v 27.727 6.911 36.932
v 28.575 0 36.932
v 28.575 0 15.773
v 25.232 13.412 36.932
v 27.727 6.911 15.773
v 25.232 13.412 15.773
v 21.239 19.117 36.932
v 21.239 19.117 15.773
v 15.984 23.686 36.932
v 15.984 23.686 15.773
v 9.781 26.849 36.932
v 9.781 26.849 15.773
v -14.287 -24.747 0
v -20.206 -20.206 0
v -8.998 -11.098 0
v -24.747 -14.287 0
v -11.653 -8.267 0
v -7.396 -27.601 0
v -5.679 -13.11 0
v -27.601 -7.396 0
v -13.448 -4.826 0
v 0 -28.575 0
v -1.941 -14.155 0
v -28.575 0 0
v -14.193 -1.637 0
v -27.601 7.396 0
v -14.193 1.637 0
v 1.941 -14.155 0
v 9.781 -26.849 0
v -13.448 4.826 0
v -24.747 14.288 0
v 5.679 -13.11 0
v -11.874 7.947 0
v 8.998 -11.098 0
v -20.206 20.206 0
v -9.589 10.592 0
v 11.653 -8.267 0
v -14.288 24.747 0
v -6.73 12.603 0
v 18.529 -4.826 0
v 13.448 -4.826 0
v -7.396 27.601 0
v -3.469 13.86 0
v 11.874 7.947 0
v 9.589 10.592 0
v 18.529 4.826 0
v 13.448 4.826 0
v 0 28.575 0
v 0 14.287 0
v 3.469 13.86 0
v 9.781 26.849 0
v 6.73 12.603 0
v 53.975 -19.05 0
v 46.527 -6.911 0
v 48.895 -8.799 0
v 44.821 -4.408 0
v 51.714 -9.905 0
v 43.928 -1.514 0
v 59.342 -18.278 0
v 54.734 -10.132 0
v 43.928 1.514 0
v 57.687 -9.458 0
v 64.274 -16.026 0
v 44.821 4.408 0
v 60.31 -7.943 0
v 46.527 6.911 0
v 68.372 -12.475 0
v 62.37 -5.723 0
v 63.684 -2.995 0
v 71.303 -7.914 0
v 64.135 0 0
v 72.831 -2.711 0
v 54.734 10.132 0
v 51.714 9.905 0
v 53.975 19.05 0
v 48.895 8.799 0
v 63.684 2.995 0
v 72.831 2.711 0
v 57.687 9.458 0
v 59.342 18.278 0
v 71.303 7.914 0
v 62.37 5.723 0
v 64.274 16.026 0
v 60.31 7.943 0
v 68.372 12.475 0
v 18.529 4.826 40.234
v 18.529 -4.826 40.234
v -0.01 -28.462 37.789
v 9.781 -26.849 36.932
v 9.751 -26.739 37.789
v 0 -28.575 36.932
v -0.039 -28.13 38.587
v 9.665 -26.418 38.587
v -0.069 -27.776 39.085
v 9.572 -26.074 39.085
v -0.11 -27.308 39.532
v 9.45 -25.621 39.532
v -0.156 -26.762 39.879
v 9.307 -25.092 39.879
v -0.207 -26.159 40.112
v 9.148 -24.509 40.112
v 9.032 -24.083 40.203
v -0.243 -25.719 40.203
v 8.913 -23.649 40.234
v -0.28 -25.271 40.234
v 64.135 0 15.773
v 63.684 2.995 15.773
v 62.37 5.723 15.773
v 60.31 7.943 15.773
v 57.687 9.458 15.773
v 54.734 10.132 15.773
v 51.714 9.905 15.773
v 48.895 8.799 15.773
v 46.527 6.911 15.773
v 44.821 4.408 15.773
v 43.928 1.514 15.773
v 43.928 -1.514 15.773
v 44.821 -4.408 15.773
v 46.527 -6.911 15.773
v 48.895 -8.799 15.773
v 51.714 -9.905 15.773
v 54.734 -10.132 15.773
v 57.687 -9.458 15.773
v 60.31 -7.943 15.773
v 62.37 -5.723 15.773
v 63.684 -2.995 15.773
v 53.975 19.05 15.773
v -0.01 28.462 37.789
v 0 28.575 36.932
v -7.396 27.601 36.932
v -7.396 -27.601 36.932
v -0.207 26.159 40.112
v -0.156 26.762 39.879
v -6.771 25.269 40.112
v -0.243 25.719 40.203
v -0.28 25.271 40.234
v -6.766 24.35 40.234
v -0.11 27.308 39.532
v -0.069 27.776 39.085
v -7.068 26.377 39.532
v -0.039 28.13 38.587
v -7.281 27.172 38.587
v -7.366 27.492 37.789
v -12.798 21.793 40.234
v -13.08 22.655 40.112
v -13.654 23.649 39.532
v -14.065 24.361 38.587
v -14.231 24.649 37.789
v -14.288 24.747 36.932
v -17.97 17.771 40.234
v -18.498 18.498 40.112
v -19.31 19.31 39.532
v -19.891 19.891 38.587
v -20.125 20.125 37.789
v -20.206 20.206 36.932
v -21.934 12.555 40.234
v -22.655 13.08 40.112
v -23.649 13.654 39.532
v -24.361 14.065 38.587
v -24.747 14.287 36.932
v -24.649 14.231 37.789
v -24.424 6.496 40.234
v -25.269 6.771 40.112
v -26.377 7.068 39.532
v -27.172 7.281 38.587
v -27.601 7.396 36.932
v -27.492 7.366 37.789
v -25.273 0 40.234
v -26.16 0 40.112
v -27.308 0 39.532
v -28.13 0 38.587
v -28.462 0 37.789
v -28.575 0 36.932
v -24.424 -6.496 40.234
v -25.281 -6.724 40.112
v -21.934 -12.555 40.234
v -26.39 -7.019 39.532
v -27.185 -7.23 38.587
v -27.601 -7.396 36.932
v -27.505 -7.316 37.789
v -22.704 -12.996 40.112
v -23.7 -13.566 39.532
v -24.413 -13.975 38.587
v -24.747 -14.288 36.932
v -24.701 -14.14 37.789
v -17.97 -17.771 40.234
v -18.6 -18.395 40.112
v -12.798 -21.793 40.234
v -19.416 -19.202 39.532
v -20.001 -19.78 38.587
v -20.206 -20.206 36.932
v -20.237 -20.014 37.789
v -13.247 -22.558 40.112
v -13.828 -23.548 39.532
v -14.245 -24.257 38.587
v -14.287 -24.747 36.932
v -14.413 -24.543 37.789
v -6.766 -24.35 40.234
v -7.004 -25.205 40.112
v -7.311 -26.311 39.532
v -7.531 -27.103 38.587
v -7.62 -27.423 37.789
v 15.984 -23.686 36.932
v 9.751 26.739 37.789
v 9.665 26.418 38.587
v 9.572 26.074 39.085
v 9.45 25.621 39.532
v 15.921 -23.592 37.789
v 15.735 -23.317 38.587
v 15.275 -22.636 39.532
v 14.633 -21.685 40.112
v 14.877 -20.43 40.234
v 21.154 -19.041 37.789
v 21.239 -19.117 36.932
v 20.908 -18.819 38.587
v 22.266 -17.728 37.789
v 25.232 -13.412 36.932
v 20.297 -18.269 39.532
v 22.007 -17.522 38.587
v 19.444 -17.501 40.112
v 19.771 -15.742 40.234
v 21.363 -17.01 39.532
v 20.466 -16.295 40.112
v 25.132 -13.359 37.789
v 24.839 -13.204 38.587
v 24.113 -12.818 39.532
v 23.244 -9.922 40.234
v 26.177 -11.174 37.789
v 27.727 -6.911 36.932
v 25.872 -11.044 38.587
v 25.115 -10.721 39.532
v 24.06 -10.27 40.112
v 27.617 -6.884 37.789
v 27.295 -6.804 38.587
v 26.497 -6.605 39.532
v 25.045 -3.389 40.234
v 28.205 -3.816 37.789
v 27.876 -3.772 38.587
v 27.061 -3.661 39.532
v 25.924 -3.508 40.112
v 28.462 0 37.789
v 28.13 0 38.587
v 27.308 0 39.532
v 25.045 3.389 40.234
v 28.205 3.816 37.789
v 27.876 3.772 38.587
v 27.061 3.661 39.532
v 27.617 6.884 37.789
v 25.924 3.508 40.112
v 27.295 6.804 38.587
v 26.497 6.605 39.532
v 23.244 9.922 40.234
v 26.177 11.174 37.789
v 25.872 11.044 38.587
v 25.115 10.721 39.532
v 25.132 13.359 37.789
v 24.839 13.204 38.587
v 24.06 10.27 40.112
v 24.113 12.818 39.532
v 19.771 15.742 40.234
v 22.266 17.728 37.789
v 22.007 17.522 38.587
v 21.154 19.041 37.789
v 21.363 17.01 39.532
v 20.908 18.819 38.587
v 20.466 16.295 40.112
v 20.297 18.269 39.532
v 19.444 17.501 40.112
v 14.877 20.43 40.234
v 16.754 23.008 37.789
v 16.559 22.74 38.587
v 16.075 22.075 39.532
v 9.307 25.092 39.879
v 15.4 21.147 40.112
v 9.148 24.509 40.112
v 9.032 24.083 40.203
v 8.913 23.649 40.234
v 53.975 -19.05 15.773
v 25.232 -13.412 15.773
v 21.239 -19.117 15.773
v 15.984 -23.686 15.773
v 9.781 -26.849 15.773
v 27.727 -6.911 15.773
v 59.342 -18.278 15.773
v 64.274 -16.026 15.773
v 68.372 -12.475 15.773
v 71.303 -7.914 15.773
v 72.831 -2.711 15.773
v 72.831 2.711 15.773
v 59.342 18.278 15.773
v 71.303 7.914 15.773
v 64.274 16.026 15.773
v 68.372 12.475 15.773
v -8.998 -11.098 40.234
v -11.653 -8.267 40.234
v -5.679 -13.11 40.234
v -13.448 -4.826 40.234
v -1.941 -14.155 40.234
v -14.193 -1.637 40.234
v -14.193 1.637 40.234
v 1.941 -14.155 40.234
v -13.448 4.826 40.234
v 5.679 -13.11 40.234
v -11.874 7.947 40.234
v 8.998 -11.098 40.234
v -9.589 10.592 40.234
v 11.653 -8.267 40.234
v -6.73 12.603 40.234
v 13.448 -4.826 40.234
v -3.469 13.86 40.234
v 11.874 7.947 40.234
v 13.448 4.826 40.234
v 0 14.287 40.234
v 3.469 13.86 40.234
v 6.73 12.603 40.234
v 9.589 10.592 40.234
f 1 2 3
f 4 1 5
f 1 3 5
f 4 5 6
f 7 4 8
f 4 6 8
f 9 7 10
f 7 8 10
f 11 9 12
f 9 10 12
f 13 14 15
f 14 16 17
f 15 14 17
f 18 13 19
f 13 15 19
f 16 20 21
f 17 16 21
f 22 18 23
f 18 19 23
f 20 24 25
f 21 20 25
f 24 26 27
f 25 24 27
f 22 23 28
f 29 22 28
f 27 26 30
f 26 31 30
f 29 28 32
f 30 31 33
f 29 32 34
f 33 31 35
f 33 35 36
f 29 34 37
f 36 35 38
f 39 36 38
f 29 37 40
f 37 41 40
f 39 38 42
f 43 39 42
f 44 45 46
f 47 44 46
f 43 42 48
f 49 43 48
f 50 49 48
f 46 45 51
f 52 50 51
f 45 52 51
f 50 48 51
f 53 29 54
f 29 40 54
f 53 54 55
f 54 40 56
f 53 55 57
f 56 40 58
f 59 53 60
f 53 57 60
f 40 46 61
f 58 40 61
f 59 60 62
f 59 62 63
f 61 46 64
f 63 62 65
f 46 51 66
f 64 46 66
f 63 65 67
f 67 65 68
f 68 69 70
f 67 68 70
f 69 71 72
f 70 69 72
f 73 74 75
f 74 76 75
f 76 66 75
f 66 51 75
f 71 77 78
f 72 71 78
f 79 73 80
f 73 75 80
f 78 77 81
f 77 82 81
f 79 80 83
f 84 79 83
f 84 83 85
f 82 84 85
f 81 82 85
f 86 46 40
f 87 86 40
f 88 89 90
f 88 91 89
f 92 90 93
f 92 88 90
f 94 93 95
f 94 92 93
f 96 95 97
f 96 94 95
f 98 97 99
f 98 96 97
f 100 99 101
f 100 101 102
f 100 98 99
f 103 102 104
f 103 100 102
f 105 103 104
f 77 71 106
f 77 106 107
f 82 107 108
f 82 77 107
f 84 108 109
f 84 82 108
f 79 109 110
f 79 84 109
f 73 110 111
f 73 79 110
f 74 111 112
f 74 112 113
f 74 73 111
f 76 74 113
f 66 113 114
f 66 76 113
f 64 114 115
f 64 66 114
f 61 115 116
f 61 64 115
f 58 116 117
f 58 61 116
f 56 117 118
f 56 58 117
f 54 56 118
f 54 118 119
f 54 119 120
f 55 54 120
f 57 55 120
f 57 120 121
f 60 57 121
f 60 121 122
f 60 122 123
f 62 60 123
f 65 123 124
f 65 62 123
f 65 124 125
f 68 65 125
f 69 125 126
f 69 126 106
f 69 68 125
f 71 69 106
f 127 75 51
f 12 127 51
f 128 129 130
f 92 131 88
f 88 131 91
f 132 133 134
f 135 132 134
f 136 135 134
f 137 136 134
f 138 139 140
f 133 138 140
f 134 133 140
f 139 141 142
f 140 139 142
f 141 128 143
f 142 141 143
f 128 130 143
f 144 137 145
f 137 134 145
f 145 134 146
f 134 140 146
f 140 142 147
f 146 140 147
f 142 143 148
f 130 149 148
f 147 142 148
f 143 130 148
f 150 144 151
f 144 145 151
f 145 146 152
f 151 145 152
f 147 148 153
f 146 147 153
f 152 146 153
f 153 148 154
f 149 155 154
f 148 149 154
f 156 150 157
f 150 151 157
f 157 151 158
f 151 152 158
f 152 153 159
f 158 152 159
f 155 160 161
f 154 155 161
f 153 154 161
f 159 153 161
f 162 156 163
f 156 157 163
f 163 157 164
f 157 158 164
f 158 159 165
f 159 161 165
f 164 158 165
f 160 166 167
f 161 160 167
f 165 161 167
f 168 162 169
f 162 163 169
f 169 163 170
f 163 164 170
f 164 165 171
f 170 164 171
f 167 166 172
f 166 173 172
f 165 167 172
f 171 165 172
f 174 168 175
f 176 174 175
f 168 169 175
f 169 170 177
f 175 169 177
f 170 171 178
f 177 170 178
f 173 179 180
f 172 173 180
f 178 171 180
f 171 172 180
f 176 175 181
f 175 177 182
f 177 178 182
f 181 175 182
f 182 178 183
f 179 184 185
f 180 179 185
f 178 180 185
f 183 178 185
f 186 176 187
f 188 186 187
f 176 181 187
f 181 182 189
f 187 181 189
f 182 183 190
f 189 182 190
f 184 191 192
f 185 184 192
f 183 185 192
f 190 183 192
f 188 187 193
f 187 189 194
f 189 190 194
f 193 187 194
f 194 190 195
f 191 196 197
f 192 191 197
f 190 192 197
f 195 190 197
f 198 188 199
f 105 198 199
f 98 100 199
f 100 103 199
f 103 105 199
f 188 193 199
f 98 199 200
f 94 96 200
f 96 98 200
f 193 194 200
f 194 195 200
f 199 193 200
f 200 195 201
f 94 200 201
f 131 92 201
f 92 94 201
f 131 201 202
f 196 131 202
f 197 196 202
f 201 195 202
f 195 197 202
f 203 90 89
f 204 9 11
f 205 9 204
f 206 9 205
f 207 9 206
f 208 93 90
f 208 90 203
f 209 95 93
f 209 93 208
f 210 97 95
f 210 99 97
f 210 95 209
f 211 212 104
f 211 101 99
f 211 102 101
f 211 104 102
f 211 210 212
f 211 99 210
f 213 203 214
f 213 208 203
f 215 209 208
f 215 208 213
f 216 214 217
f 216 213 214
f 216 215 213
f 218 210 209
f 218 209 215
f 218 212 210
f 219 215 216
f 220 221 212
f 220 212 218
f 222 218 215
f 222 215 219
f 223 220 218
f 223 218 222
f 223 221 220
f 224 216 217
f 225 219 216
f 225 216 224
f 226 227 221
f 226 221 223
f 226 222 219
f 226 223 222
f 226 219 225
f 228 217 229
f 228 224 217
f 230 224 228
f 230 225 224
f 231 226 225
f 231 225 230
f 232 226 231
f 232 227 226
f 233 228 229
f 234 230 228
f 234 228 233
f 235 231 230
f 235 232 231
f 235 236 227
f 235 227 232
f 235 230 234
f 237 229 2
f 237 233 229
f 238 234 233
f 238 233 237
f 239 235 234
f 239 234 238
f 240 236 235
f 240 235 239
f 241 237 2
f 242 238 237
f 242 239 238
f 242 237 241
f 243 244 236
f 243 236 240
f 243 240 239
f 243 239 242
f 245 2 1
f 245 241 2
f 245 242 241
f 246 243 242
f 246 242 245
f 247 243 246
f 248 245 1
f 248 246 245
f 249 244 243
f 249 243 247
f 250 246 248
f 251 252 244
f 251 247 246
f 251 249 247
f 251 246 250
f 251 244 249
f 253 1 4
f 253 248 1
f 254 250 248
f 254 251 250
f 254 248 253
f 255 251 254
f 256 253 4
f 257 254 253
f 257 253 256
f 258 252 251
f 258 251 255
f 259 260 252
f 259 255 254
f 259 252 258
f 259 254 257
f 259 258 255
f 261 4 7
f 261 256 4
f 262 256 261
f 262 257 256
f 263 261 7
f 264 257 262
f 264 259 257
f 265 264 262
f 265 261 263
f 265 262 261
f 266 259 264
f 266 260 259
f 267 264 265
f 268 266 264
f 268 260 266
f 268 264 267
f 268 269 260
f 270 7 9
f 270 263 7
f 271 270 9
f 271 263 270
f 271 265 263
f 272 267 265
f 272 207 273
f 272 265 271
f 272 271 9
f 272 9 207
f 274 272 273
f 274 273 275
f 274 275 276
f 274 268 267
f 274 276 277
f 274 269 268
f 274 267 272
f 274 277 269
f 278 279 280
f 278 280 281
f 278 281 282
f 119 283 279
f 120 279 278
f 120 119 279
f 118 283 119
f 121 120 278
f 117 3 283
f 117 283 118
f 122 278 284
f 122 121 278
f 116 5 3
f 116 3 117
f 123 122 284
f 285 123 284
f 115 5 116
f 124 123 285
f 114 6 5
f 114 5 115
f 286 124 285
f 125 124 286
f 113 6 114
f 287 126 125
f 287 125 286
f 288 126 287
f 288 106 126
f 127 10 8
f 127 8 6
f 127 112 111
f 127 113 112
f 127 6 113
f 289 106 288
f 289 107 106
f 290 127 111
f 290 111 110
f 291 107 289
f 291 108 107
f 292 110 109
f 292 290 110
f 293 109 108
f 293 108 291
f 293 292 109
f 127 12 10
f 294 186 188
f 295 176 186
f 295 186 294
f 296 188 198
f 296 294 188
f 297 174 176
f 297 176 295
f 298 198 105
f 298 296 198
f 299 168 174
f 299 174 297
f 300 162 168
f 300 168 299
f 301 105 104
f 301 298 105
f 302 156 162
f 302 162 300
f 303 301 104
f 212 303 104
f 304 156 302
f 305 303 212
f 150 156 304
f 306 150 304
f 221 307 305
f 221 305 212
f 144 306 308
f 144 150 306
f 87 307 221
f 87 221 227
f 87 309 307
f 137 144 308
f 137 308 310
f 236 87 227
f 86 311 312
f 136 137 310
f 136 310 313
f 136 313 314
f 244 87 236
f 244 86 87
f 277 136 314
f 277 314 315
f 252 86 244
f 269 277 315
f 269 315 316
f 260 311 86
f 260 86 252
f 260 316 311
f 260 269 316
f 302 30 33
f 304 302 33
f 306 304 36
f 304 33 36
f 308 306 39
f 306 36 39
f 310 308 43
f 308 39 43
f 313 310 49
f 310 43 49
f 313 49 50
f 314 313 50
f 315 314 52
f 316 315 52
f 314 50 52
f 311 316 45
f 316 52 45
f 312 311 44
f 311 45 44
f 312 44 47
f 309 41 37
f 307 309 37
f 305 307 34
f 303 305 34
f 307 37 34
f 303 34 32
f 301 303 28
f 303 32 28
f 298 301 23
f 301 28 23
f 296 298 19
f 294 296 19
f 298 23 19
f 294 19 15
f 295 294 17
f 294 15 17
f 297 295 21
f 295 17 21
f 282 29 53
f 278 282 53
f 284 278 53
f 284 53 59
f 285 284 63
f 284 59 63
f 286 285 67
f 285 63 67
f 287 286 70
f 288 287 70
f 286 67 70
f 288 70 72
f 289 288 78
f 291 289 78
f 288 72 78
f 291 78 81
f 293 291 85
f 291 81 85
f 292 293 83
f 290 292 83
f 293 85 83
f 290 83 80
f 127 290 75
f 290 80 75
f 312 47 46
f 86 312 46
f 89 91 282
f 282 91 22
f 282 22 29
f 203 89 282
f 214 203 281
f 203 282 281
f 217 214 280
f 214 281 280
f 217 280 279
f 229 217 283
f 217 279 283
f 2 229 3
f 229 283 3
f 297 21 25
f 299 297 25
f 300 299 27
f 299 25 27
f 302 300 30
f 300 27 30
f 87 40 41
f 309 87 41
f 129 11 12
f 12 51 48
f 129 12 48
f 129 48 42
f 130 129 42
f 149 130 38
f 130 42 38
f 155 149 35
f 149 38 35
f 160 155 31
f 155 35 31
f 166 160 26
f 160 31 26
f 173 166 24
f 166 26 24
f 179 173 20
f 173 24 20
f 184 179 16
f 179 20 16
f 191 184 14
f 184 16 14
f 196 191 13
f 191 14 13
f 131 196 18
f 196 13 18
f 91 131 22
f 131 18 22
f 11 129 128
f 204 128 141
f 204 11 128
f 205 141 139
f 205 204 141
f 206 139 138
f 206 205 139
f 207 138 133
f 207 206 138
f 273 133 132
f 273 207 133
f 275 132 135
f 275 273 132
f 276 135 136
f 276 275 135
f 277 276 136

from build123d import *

# Parameters (mm, degrees)
F0_R        = 10.16
F1_DEPTH    = 15.7734
F2_DEPTH    = 40.2336
F3_T1_DEPTH = 37.9988318329
F3_T3_DEPTH = 37.9988318329
F3_T6_ANGLE = 213.1574660215
F3_T8_ANGLE = 173.1044855741


# Not quite as in the source:
# - a fillet or chamfer that OpenCascade refuses, or shapes differently, is made with other operations: its cross-section is extruded or revolved along the edge and cut away or added


with BuildPart() as f1:
    # F0 (on Top) → F1 (new body)
    with BuildSketch(Plane.XY):
        with BuildLine():
            Line((53.975, 19.05), (9.780704698, 26.8489932886))
            ThreePointArc((9.780704698, 26.8489932886), (23.4095521288, 16.3866864902), (28.575, 0))
            ThreePointArc((28.575, 0), (23.4095521288, -16.3866864902), (9.780704698, -26.8489932886))
            Line((9.780704698, -26.8489932886), (53.975, -19.05))
            ThreePointArc((53.975, -19.05), (73.025, 0), (53.975, 19.05))
        make_face()
        with Locations((53.975, 0)):
            Circle(F0_R, mode=Mode.SUBTRACT)
    extrude(amount=F1_DEPTH)

    # F0 (on Top) → F2 (join)
    with BuildSketch(Plane.XY):
        with BuildLine():
            Line((9.780704698, 26.8489932886), (0, 28.575))
            ThreePointArc((0, 28.575), (-28.575, 0), (0, -28.575))
            Line((0, -28.575), (9.780704698, -26.8489932886))
            ThreePointArc((9.780704698, -26.8489932886), (23.4095521288, -16.3866864902), (28.575, 0))
            ThreePointArc((28.575, 0), (23.4095521288, 16.3866864902), (9.780704698, 26.8489932886))
        make_face()
        with BuildLine():
            ThreePointArc((-13.4477648793, 4.826), (-8.2213496839, 11.6851215494), (0, 14.2875))
            ThreePointArc((0, 14.2875), (8.2213496839, 11.6851215494), (13.4477648793, 4.826))
            Line((13.4477648793, 4.826), (18.5293, 4.826))
            Line((18.5293, 4.826), (18.5293, -4.826))
            Line((18.5293, -4.826), (13.4477648793, -4.826))
            ThreePointArc((13.4477648793, -4.826), (0, -14.2875), (-13.4477648793, -4.826))
            Line((-13.4477648793, -4.826), (-18.5293, -4.826))
            Line((-18.5293, -4.826), (-18.5293, 4.826))
            Line((-18.5293, 4.826), (-13.4477648793, 4.826))
        make_face(mode=Mode.SUBTRACT)
        with BuildLine():
            ThreePointArc((-13.4477648793, -4.826), (-14.2875, 0), (-13.4477648793, 4.826))
            Line((-13.4477648793, 4.826), (-18.5293, 4.826))
            Line((-18.5293, 4.826), (-18.5293, -4.826))
            Line((-18.5293, -4.826), (-13.4477648793, -4.826))
        make_face()
    extrude(amount=F2_DEPTH)

    # F3: fillet of radius 3.302 on 4 edges, made by hand

    # F3_s2 → F3_t1 (cut)
    with BuildSketch(Plane(origin=(18.7103124217, -3.3018198391, 0), x_dir=(0, 0, 1), z_dir=(-0.9847835588, 0.1737853339, 0))):
        with BuildLine():
            ThreePointArc((36.9316, 28.1401901932), (39.2664665915, 27.1730567847), (40.2336, 24.8381901932))
            Line((40.2336, 24.8381901932), (40.2336, 28.1401901932))
            Line((40.2336, 28.1401901932), (36.9316, 28.1401901932))
        make_face()
    extrude(amount=F3_T1_DEPTH, mode=Mode.SUBTRACT)

    # F3_s4 → F3_t3 (cut)
    with BuildSketch(Plane(origin=(-18.7103124217, -3.3018198391, 0), x_dir=(0, 0, 1), z_dir=(0.9847835588, 0.1737853339, 0))):
        with BuildLine():
            ThreePointArc((36.9316, 28.1401901932), (39.2664665915, 27.1730567847), (40.2336, 24.8381901932))
            Line((40.2336, 24.8381901932), (40.2336, 28.1401901932))
            Line((40.2336, 28.1401901932), (36.9316, 28.1401901932))
        make_face()
    extrude(amount=F3_T3_DEPTH, mode=Mode.SUBTRACT)

    # F3_s5 → F3_t6 (revolve, cut)
    with BuildSketch(Plane(origin=(0, 0, 0), x_dir=(0, 0, 1), z_dir=(0.95842855, -0.2853326385, 0))):
        with BuildLine():
            ThreePointArc((40.2336, -25.273), (39.2664665915, -27.6078665915), (36.9316, -28.575))
            Line((36.9316, -28.575), (40.2336, -28.575))
            Line((40.2336, -28.575), (40.2336, -25.273))
        make_face()
    revolve(axis=Axis((0, 0, 40.2336), (0, 0, 1)), revolution_arc=F3_T6_ANGLE, mode=Mode.SUBTRACT)

    # F3_s7 → F3_t8 (revolve, cut)
    with BuildSketch(Plane(origin=(0, 0, 0), x_dir=(0, 0, 1), z_dir=(-0.9981900481, -0.0601384063, 0))):
        with BuildLine():
            ThreePointArc((36.9316, -28.575), (39.2664665915, -27.6078665915), (40.2336, -25.273))
            Line((40.2336, -25.273), (40.2336, -28.575))
            Line((40.2336, -28.575), (36.9316, -28.575))
        make_face()
    revolve(axis=Axis((0, 0, 40.2336), (0, 0, 1)), revolution_arc=F3_T8_ANGLE, mode=Mode.SUBTRACT)


solid = f1.part
